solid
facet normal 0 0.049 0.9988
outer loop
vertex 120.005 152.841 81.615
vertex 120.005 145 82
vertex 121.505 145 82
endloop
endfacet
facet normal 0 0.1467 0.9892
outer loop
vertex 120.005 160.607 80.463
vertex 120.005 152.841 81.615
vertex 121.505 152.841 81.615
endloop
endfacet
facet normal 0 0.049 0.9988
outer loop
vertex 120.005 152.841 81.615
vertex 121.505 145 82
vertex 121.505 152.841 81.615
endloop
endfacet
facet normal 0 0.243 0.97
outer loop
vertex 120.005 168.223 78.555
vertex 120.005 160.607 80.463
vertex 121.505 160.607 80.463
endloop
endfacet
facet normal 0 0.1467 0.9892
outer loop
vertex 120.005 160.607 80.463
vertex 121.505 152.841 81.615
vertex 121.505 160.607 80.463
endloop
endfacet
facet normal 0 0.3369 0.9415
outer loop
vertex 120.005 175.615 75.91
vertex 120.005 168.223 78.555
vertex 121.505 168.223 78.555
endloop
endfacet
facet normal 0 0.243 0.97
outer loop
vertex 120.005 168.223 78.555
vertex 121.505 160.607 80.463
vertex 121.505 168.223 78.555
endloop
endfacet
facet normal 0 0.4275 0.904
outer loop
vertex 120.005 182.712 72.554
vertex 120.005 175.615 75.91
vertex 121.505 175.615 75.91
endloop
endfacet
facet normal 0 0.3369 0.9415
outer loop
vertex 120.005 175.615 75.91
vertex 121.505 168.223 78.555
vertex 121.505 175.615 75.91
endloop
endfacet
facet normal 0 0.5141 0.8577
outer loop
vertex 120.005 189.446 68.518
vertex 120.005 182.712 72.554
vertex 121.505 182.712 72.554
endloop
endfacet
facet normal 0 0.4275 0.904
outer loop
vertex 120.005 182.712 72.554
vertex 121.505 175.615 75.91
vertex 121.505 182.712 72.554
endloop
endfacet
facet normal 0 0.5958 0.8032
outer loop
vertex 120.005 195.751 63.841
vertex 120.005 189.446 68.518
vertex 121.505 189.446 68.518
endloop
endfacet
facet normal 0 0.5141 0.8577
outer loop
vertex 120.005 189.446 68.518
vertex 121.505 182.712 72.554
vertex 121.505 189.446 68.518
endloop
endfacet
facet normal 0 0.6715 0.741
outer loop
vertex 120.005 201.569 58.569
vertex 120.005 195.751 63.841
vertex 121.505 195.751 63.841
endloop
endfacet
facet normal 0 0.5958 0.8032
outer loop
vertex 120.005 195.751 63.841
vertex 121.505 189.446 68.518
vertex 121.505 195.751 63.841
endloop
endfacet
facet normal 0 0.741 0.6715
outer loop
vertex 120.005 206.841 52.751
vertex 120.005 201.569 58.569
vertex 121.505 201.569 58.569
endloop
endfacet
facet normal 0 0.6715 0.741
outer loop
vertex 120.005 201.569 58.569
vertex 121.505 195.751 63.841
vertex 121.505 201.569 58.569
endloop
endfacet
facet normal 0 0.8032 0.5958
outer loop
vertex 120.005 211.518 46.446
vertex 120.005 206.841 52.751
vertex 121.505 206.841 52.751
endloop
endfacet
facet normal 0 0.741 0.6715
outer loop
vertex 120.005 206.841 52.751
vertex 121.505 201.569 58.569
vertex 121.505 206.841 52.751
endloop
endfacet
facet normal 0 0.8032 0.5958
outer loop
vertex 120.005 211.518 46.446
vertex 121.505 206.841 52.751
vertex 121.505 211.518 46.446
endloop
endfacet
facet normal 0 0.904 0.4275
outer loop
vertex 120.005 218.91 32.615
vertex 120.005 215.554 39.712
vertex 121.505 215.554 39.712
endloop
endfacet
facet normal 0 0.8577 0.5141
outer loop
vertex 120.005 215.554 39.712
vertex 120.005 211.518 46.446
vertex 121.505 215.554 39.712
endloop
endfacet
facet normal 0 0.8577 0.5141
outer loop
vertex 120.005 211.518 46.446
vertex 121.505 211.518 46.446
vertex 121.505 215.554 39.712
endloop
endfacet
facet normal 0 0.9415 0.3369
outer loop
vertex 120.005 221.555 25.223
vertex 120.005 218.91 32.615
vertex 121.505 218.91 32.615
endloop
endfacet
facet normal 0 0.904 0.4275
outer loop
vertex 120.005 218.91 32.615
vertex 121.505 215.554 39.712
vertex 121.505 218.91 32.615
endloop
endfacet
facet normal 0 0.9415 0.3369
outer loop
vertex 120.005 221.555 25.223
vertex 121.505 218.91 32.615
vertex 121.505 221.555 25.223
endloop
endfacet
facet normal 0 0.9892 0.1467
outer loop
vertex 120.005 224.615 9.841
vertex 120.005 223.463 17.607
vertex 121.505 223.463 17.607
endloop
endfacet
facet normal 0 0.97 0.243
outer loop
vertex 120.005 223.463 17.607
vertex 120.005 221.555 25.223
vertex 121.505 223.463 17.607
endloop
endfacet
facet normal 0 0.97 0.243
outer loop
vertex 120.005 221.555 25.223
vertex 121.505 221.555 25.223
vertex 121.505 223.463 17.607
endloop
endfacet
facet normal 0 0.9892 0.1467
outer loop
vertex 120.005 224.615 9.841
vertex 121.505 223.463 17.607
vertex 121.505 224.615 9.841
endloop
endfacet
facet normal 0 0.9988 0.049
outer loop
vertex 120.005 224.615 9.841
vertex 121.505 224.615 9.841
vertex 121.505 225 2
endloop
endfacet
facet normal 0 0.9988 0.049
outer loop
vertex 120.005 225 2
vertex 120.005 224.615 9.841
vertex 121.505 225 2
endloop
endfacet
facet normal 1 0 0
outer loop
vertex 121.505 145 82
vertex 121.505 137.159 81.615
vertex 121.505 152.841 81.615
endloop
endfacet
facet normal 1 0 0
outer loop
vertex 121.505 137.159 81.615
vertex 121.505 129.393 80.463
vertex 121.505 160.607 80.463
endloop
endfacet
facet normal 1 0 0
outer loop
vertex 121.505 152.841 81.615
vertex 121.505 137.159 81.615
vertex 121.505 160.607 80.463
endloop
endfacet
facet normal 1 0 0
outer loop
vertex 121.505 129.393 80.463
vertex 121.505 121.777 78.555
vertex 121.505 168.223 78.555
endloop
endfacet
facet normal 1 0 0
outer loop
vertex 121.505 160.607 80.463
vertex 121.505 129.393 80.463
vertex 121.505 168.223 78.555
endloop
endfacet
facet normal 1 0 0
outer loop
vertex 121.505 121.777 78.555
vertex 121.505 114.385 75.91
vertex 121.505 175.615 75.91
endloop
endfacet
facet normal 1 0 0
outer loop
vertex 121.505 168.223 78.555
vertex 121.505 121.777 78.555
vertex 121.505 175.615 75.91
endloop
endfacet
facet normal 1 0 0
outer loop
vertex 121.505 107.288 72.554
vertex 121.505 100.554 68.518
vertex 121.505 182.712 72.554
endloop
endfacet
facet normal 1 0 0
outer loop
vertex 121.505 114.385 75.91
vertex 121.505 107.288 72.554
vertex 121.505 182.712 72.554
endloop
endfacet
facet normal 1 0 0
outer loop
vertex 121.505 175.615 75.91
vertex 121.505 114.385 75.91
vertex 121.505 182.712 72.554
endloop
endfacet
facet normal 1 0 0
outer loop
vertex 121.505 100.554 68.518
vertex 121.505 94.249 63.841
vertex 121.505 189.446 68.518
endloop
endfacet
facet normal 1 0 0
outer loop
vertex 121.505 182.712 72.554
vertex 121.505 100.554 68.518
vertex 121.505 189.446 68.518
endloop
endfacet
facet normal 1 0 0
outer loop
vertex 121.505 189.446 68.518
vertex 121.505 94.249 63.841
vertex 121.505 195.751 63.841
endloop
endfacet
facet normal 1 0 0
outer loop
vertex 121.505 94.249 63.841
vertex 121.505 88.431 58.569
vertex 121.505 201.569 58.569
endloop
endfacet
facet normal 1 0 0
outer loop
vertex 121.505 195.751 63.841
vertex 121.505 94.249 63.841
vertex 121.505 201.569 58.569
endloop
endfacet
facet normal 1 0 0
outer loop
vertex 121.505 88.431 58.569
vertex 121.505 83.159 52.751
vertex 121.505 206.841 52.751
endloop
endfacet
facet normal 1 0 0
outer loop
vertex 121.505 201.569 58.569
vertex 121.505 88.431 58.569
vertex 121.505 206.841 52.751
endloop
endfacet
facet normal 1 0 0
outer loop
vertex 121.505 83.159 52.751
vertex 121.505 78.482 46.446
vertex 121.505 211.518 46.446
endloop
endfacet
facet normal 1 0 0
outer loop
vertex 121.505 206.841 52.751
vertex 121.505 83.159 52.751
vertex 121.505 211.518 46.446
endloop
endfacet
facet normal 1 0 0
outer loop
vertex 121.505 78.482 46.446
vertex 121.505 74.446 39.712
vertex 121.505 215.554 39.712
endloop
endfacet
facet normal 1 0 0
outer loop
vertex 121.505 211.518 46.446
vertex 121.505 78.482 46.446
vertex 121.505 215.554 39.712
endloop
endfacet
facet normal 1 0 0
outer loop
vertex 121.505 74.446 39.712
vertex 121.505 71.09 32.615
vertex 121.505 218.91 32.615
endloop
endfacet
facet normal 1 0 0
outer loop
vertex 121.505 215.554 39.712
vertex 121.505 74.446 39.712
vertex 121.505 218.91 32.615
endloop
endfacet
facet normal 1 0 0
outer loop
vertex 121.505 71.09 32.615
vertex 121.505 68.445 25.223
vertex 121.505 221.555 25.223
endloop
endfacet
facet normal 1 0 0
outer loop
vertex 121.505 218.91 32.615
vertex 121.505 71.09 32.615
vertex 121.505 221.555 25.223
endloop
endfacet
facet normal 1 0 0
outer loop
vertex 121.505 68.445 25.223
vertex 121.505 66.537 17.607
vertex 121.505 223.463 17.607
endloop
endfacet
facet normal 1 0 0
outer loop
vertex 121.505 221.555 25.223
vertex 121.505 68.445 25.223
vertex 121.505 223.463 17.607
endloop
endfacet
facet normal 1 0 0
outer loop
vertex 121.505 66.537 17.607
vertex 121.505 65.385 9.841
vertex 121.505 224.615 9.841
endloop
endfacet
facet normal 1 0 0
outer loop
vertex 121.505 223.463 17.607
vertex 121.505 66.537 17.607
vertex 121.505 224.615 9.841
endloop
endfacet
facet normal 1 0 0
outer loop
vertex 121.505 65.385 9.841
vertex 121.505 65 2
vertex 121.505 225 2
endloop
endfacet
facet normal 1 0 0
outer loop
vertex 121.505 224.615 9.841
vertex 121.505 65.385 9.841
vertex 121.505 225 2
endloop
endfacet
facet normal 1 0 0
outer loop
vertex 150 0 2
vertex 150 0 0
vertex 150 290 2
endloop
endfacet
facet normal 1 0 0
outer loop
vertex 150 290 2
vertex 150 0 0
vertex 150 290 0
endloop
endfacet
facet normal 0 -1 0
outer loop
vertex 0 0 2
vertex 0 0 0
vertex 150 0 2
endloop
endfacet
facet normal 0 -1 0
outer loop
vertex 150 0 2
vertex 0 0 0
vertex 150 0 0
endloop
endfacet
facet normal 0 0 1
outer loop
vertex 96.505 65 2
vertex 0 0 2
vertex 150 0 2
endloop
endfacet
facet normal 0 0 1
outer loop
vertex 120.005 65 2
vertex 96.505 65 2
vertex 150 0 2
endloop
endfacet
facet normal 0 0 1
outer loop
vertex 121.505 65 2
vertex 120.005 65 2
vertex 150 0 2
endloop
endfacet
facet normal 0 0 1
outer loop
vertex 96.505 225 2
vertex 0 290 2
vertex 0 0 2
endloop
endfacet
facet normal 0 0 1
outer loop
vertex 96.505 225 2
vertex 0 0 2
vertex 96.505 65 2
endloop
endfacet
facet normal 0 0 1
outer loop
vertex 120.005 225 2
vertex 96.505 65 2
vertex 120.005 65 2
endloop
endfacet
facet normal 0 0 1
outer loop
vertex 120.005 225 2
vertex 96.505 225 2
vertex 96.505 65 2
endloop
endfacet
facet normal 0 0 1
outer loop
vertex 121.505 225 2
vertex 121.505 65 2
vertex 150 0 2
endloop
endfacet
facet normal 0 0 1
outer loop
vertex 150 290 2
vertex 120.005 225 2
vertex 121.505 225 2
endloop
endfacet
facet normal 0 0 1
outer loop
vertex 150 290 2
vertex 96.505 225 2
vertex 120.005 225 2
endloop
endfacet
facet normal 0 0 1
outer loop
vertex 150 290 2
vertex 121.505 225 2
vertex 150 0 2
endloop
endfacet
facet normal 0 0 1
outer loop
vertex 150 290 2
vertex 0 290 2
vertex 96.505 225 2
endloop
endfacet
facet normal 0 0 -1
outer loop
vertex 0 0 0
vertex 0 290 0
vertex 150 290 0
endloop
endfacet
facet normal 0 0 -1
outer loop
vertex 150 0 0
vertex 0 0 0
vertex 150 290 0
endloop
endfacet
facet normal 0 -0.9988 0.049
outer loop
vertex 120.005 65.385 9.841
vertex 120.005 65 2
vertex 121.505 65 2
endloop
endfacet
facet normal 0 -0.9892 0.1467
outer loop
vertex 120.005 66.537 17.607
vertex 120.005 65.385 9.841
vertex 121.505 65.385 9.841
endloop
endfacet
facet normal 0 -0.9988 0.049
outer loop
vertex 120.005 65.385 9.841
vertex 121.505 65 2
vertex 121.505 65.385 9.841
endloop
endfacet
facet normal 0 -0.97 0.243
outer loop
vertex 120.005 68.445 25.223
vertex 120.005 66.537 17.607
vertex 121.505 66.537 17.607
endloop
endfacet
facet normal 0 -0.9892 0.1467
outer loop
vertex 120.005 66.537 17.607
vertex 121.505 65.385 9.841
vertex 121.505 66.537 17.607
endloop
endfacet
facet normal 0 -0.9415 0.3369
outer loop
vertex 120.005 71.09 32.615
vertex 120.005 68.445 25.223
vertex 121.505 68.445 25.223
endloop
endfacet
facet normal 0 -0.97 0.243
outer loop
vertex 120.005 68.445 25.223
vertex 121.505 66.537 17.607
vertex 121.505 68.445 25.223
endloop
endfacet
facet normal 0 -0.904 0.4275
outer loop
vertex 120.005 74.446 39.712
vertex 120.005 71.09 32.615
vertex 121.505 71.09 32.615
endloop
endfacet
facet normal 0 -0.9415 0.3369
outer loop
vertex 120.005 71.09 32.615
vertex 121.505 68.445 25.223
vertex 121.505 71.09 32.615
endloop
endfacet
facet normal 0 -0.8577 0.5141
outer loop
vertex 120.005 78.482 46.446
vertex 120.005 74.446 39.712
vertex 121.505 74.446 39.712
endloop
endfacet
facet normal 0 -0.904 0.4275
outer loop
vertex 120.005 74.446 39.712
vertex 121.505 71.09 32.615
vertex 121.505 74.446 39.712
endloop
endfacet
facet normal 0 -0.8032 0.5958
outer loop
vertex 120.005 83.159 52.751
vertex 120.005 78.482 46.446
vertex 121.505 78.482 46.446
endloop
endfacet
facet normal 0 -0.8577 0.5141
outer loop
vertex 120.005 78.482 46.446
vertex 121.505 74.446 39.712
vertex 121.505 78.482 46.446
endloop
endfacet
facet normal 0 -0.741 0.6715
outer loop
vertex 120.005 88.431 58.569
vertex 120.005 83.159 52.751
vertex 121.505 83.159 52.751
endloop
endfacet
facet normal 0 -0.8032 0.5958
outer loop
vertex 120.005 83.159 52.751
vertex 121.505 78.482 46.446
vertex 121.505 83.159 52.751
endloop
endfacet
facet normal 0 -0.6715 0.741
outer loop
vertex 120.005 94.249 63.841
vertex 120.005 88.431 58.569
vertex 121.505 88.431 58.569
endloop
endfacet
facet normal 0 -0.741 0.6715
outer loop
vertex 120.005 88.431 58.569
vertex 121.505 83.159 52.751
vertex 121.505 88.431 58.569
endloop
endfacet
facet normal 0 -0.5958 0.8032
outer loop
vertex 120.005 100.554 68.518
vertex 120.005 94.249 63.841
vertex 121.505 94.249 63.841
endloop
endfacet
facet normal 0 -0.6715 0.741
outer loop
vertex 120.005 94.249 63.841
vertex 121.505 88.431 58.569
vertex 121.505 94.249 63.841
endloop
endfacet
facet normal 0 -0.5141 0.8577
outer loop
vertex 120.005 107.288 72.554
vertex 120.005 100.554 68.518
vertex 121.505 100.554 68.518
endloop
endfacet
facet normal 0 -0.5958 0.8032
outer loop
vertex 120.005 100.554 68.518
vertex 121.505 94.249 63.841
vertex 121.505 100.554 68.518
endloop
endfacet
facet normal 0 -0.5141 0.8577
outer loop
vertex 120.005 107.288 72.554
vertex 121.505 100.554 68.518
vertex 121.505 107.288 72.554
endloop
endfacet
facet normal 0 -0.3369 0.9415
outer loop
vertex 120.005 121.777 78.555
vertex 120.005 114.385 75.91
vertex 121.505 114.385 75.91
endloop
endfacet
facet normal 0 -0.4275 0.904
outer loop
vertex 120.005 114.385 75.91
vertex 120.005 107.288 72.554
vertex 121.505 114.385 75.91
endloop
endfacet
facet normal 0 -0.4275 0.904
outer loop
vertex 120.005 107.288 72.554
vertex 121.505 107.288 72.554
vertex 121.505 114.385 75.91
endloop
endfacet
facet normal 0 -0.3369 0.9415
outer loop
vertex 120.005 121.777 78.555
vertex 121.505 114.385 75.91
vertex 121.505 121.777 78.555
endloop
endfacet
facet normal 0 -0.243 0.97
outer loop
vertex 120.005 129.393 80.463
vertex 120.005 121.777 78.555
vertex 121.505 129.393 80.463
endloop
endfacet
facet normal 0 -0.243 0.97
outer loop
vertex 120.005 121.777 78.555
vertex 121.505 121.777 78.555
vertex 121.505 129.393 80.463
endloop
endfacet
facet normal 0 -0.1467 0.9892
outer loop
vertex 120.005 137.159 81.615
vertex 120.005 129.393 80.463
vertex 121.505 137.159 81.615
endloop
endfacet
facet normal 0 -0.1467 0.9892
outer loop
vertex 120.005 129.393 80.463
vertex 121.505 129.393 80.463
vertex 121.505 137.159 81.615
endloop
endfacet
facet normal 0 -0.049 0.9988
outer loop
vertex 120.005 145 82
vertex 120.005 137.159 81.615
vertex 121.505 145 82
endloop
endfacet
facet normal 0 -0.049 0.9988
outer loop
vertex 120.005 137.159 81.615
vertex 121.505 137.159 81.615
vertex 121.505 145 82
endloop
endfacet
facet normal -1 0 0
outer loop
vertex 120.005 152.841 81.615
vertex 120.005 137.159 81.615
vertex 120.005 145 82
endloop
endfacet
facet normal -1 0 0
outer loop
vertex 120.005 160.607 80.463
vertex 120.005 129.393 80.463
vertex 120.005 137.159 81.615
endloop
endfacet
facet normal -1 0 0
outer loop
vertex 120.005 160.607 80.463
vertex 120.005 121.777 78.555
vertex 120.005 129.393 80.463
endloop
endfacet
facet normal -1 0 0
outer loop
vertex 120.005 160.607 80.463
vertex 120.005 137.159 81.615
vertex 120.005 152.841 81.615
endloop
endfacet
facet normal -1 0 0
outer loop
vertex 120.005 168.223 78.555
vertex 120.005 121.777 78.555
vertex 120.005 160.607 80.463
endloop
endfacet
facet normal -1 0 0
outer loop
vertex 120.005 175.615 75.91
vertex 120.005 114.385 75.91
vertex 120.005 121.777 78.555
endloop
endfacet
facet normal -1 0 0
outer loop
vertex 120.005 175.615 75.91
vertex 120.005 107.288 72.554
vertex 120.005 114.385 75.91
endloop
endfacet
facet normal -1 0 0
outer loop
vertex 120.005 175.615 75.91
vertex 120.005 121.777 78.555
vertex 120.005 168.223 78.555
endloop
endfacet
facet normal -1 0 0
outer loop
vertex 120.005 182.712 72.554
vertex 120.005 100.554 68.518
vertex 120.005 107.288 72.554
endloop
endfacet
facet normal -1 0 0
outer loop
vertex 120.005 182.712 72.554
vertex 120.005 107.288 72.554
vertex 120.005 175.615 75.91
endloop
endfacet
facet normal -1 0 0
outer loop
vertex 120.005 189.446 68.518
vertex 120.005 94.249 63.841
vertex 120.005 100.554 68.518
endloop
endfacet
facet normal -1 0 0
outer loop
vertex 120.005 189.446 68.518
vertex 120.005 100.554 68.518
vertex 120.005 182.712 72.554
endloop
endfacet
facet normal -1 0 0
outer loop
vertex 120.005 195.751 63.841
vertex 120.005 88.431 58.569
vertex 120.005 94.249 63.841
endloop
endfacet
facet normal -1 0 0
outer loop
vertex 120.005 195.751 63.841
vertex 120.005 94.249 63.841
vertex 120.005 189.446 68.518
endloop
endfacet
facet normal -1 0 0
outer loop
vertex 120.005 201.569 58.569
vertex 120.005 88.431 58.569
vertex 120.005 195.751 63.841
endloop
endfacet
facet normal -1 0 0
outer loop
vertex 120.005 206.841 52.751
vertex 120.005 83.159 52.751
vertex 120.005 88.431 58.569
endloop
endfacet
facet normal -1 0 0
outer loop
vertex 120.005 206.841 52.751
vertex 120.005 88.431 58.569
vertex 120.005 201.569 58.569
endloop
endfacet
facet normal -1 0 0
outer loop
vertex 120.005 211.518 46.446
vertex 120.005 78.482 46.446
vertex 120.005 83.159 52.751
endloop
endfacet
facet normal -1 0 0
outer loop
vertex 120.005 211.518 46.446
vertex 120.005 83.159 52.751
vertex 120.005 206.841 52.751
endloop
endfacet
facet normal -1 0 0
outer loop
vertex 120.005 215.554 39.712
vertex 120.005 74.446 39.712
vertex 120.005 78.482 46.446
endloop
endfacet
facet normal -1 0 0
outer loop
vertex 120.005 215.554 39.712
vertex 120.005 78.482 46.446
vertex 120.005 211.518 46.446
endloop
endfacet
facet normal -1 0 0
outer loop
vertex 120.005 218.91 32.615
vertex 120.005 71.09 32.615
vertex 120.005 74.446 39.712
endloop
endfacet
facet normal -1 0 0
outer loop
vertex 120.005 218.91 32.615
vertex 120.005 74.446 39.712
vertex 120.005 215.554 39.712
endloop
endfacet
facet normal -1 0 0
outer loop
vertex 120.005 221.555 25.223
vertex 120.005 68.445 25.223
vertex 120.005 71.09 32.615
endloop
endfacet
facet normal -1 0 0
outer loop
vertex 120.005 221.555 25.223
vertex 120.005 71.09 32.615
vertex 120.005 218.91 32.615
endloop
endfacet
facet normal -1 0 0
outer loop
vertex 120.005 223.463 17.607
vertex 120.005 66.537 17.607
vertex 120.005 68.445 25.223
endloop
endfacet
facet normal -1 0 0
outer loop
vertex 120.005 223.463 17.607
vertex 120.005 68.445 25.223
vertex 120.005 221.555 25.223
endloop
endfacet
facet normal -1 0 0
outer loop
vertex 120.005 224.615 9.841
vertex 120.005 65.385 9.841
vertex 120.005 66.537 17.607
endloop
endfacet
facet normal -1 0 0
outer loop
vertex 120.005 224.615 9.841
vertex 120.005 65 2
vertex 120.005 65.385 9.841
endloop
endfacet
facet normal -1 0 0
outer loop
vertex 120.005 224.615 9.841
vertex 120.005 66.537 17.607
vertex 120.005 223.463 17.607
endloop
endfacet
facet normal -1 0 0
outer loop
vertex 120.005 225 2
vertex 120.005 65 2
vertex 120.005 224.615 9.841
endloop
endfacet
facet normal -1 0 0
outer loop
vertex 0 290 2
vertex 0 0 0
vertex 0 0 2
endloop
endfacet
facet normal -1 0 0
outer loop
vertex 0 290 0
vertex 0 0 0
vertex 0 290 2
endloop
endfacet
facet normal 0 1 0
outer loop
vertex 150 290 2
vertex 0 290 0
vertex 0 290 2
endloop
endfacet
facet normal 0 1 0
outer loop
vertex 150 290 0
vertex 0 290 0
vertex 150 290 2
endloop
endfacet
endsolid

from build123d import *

# Parameters (mm, degrees)
F0_W     = 150
F0_H     = 290
F1_DEPTH = 2
F2_W     = 1.5
F2_H     = 160
F3_DEPTH = 80
F5_DEPTH = 25


with BuildPart() as f1:
    # F0 (on Top) → F1 (new body)
    with BuildSketch(Plane.XY):
        with Locations((75, 145)):
            Rectangle(F0_W, F0_H)
    extrude(amount=F1_DEPTH)

    # F2 (on face) → F3 (join)
    with BuildSketch(Plane.XY.offset(2)):
        with Locations((120.755315, 145)):
            Rectangle(F2_W, F2_H)
    extrude(amount=F3_DEPTH)

    # F4 (on face) → F5 (cut)
    with BuildSketch(Plane.YZ.offset(121.505315)):
        with BuildLine():
            Line((65, 82), (65, 2))
            ThreePointArc((65, 2), (88.431458, 58.568542), (145, 82))
            Line((145, 82), (65, 82))
        make_face()
        with BuildLine():
            ThreePointArc((145, 82), (201.568542, 58.568542), (225, 2))
            Line((225, 2), (225, 82))
            Line((225, 82), (145, 82))
        make_face()
    extrude(amount=-F5_DEPTH, mode=Mode.SUBTRACT)


solid = f1.part
